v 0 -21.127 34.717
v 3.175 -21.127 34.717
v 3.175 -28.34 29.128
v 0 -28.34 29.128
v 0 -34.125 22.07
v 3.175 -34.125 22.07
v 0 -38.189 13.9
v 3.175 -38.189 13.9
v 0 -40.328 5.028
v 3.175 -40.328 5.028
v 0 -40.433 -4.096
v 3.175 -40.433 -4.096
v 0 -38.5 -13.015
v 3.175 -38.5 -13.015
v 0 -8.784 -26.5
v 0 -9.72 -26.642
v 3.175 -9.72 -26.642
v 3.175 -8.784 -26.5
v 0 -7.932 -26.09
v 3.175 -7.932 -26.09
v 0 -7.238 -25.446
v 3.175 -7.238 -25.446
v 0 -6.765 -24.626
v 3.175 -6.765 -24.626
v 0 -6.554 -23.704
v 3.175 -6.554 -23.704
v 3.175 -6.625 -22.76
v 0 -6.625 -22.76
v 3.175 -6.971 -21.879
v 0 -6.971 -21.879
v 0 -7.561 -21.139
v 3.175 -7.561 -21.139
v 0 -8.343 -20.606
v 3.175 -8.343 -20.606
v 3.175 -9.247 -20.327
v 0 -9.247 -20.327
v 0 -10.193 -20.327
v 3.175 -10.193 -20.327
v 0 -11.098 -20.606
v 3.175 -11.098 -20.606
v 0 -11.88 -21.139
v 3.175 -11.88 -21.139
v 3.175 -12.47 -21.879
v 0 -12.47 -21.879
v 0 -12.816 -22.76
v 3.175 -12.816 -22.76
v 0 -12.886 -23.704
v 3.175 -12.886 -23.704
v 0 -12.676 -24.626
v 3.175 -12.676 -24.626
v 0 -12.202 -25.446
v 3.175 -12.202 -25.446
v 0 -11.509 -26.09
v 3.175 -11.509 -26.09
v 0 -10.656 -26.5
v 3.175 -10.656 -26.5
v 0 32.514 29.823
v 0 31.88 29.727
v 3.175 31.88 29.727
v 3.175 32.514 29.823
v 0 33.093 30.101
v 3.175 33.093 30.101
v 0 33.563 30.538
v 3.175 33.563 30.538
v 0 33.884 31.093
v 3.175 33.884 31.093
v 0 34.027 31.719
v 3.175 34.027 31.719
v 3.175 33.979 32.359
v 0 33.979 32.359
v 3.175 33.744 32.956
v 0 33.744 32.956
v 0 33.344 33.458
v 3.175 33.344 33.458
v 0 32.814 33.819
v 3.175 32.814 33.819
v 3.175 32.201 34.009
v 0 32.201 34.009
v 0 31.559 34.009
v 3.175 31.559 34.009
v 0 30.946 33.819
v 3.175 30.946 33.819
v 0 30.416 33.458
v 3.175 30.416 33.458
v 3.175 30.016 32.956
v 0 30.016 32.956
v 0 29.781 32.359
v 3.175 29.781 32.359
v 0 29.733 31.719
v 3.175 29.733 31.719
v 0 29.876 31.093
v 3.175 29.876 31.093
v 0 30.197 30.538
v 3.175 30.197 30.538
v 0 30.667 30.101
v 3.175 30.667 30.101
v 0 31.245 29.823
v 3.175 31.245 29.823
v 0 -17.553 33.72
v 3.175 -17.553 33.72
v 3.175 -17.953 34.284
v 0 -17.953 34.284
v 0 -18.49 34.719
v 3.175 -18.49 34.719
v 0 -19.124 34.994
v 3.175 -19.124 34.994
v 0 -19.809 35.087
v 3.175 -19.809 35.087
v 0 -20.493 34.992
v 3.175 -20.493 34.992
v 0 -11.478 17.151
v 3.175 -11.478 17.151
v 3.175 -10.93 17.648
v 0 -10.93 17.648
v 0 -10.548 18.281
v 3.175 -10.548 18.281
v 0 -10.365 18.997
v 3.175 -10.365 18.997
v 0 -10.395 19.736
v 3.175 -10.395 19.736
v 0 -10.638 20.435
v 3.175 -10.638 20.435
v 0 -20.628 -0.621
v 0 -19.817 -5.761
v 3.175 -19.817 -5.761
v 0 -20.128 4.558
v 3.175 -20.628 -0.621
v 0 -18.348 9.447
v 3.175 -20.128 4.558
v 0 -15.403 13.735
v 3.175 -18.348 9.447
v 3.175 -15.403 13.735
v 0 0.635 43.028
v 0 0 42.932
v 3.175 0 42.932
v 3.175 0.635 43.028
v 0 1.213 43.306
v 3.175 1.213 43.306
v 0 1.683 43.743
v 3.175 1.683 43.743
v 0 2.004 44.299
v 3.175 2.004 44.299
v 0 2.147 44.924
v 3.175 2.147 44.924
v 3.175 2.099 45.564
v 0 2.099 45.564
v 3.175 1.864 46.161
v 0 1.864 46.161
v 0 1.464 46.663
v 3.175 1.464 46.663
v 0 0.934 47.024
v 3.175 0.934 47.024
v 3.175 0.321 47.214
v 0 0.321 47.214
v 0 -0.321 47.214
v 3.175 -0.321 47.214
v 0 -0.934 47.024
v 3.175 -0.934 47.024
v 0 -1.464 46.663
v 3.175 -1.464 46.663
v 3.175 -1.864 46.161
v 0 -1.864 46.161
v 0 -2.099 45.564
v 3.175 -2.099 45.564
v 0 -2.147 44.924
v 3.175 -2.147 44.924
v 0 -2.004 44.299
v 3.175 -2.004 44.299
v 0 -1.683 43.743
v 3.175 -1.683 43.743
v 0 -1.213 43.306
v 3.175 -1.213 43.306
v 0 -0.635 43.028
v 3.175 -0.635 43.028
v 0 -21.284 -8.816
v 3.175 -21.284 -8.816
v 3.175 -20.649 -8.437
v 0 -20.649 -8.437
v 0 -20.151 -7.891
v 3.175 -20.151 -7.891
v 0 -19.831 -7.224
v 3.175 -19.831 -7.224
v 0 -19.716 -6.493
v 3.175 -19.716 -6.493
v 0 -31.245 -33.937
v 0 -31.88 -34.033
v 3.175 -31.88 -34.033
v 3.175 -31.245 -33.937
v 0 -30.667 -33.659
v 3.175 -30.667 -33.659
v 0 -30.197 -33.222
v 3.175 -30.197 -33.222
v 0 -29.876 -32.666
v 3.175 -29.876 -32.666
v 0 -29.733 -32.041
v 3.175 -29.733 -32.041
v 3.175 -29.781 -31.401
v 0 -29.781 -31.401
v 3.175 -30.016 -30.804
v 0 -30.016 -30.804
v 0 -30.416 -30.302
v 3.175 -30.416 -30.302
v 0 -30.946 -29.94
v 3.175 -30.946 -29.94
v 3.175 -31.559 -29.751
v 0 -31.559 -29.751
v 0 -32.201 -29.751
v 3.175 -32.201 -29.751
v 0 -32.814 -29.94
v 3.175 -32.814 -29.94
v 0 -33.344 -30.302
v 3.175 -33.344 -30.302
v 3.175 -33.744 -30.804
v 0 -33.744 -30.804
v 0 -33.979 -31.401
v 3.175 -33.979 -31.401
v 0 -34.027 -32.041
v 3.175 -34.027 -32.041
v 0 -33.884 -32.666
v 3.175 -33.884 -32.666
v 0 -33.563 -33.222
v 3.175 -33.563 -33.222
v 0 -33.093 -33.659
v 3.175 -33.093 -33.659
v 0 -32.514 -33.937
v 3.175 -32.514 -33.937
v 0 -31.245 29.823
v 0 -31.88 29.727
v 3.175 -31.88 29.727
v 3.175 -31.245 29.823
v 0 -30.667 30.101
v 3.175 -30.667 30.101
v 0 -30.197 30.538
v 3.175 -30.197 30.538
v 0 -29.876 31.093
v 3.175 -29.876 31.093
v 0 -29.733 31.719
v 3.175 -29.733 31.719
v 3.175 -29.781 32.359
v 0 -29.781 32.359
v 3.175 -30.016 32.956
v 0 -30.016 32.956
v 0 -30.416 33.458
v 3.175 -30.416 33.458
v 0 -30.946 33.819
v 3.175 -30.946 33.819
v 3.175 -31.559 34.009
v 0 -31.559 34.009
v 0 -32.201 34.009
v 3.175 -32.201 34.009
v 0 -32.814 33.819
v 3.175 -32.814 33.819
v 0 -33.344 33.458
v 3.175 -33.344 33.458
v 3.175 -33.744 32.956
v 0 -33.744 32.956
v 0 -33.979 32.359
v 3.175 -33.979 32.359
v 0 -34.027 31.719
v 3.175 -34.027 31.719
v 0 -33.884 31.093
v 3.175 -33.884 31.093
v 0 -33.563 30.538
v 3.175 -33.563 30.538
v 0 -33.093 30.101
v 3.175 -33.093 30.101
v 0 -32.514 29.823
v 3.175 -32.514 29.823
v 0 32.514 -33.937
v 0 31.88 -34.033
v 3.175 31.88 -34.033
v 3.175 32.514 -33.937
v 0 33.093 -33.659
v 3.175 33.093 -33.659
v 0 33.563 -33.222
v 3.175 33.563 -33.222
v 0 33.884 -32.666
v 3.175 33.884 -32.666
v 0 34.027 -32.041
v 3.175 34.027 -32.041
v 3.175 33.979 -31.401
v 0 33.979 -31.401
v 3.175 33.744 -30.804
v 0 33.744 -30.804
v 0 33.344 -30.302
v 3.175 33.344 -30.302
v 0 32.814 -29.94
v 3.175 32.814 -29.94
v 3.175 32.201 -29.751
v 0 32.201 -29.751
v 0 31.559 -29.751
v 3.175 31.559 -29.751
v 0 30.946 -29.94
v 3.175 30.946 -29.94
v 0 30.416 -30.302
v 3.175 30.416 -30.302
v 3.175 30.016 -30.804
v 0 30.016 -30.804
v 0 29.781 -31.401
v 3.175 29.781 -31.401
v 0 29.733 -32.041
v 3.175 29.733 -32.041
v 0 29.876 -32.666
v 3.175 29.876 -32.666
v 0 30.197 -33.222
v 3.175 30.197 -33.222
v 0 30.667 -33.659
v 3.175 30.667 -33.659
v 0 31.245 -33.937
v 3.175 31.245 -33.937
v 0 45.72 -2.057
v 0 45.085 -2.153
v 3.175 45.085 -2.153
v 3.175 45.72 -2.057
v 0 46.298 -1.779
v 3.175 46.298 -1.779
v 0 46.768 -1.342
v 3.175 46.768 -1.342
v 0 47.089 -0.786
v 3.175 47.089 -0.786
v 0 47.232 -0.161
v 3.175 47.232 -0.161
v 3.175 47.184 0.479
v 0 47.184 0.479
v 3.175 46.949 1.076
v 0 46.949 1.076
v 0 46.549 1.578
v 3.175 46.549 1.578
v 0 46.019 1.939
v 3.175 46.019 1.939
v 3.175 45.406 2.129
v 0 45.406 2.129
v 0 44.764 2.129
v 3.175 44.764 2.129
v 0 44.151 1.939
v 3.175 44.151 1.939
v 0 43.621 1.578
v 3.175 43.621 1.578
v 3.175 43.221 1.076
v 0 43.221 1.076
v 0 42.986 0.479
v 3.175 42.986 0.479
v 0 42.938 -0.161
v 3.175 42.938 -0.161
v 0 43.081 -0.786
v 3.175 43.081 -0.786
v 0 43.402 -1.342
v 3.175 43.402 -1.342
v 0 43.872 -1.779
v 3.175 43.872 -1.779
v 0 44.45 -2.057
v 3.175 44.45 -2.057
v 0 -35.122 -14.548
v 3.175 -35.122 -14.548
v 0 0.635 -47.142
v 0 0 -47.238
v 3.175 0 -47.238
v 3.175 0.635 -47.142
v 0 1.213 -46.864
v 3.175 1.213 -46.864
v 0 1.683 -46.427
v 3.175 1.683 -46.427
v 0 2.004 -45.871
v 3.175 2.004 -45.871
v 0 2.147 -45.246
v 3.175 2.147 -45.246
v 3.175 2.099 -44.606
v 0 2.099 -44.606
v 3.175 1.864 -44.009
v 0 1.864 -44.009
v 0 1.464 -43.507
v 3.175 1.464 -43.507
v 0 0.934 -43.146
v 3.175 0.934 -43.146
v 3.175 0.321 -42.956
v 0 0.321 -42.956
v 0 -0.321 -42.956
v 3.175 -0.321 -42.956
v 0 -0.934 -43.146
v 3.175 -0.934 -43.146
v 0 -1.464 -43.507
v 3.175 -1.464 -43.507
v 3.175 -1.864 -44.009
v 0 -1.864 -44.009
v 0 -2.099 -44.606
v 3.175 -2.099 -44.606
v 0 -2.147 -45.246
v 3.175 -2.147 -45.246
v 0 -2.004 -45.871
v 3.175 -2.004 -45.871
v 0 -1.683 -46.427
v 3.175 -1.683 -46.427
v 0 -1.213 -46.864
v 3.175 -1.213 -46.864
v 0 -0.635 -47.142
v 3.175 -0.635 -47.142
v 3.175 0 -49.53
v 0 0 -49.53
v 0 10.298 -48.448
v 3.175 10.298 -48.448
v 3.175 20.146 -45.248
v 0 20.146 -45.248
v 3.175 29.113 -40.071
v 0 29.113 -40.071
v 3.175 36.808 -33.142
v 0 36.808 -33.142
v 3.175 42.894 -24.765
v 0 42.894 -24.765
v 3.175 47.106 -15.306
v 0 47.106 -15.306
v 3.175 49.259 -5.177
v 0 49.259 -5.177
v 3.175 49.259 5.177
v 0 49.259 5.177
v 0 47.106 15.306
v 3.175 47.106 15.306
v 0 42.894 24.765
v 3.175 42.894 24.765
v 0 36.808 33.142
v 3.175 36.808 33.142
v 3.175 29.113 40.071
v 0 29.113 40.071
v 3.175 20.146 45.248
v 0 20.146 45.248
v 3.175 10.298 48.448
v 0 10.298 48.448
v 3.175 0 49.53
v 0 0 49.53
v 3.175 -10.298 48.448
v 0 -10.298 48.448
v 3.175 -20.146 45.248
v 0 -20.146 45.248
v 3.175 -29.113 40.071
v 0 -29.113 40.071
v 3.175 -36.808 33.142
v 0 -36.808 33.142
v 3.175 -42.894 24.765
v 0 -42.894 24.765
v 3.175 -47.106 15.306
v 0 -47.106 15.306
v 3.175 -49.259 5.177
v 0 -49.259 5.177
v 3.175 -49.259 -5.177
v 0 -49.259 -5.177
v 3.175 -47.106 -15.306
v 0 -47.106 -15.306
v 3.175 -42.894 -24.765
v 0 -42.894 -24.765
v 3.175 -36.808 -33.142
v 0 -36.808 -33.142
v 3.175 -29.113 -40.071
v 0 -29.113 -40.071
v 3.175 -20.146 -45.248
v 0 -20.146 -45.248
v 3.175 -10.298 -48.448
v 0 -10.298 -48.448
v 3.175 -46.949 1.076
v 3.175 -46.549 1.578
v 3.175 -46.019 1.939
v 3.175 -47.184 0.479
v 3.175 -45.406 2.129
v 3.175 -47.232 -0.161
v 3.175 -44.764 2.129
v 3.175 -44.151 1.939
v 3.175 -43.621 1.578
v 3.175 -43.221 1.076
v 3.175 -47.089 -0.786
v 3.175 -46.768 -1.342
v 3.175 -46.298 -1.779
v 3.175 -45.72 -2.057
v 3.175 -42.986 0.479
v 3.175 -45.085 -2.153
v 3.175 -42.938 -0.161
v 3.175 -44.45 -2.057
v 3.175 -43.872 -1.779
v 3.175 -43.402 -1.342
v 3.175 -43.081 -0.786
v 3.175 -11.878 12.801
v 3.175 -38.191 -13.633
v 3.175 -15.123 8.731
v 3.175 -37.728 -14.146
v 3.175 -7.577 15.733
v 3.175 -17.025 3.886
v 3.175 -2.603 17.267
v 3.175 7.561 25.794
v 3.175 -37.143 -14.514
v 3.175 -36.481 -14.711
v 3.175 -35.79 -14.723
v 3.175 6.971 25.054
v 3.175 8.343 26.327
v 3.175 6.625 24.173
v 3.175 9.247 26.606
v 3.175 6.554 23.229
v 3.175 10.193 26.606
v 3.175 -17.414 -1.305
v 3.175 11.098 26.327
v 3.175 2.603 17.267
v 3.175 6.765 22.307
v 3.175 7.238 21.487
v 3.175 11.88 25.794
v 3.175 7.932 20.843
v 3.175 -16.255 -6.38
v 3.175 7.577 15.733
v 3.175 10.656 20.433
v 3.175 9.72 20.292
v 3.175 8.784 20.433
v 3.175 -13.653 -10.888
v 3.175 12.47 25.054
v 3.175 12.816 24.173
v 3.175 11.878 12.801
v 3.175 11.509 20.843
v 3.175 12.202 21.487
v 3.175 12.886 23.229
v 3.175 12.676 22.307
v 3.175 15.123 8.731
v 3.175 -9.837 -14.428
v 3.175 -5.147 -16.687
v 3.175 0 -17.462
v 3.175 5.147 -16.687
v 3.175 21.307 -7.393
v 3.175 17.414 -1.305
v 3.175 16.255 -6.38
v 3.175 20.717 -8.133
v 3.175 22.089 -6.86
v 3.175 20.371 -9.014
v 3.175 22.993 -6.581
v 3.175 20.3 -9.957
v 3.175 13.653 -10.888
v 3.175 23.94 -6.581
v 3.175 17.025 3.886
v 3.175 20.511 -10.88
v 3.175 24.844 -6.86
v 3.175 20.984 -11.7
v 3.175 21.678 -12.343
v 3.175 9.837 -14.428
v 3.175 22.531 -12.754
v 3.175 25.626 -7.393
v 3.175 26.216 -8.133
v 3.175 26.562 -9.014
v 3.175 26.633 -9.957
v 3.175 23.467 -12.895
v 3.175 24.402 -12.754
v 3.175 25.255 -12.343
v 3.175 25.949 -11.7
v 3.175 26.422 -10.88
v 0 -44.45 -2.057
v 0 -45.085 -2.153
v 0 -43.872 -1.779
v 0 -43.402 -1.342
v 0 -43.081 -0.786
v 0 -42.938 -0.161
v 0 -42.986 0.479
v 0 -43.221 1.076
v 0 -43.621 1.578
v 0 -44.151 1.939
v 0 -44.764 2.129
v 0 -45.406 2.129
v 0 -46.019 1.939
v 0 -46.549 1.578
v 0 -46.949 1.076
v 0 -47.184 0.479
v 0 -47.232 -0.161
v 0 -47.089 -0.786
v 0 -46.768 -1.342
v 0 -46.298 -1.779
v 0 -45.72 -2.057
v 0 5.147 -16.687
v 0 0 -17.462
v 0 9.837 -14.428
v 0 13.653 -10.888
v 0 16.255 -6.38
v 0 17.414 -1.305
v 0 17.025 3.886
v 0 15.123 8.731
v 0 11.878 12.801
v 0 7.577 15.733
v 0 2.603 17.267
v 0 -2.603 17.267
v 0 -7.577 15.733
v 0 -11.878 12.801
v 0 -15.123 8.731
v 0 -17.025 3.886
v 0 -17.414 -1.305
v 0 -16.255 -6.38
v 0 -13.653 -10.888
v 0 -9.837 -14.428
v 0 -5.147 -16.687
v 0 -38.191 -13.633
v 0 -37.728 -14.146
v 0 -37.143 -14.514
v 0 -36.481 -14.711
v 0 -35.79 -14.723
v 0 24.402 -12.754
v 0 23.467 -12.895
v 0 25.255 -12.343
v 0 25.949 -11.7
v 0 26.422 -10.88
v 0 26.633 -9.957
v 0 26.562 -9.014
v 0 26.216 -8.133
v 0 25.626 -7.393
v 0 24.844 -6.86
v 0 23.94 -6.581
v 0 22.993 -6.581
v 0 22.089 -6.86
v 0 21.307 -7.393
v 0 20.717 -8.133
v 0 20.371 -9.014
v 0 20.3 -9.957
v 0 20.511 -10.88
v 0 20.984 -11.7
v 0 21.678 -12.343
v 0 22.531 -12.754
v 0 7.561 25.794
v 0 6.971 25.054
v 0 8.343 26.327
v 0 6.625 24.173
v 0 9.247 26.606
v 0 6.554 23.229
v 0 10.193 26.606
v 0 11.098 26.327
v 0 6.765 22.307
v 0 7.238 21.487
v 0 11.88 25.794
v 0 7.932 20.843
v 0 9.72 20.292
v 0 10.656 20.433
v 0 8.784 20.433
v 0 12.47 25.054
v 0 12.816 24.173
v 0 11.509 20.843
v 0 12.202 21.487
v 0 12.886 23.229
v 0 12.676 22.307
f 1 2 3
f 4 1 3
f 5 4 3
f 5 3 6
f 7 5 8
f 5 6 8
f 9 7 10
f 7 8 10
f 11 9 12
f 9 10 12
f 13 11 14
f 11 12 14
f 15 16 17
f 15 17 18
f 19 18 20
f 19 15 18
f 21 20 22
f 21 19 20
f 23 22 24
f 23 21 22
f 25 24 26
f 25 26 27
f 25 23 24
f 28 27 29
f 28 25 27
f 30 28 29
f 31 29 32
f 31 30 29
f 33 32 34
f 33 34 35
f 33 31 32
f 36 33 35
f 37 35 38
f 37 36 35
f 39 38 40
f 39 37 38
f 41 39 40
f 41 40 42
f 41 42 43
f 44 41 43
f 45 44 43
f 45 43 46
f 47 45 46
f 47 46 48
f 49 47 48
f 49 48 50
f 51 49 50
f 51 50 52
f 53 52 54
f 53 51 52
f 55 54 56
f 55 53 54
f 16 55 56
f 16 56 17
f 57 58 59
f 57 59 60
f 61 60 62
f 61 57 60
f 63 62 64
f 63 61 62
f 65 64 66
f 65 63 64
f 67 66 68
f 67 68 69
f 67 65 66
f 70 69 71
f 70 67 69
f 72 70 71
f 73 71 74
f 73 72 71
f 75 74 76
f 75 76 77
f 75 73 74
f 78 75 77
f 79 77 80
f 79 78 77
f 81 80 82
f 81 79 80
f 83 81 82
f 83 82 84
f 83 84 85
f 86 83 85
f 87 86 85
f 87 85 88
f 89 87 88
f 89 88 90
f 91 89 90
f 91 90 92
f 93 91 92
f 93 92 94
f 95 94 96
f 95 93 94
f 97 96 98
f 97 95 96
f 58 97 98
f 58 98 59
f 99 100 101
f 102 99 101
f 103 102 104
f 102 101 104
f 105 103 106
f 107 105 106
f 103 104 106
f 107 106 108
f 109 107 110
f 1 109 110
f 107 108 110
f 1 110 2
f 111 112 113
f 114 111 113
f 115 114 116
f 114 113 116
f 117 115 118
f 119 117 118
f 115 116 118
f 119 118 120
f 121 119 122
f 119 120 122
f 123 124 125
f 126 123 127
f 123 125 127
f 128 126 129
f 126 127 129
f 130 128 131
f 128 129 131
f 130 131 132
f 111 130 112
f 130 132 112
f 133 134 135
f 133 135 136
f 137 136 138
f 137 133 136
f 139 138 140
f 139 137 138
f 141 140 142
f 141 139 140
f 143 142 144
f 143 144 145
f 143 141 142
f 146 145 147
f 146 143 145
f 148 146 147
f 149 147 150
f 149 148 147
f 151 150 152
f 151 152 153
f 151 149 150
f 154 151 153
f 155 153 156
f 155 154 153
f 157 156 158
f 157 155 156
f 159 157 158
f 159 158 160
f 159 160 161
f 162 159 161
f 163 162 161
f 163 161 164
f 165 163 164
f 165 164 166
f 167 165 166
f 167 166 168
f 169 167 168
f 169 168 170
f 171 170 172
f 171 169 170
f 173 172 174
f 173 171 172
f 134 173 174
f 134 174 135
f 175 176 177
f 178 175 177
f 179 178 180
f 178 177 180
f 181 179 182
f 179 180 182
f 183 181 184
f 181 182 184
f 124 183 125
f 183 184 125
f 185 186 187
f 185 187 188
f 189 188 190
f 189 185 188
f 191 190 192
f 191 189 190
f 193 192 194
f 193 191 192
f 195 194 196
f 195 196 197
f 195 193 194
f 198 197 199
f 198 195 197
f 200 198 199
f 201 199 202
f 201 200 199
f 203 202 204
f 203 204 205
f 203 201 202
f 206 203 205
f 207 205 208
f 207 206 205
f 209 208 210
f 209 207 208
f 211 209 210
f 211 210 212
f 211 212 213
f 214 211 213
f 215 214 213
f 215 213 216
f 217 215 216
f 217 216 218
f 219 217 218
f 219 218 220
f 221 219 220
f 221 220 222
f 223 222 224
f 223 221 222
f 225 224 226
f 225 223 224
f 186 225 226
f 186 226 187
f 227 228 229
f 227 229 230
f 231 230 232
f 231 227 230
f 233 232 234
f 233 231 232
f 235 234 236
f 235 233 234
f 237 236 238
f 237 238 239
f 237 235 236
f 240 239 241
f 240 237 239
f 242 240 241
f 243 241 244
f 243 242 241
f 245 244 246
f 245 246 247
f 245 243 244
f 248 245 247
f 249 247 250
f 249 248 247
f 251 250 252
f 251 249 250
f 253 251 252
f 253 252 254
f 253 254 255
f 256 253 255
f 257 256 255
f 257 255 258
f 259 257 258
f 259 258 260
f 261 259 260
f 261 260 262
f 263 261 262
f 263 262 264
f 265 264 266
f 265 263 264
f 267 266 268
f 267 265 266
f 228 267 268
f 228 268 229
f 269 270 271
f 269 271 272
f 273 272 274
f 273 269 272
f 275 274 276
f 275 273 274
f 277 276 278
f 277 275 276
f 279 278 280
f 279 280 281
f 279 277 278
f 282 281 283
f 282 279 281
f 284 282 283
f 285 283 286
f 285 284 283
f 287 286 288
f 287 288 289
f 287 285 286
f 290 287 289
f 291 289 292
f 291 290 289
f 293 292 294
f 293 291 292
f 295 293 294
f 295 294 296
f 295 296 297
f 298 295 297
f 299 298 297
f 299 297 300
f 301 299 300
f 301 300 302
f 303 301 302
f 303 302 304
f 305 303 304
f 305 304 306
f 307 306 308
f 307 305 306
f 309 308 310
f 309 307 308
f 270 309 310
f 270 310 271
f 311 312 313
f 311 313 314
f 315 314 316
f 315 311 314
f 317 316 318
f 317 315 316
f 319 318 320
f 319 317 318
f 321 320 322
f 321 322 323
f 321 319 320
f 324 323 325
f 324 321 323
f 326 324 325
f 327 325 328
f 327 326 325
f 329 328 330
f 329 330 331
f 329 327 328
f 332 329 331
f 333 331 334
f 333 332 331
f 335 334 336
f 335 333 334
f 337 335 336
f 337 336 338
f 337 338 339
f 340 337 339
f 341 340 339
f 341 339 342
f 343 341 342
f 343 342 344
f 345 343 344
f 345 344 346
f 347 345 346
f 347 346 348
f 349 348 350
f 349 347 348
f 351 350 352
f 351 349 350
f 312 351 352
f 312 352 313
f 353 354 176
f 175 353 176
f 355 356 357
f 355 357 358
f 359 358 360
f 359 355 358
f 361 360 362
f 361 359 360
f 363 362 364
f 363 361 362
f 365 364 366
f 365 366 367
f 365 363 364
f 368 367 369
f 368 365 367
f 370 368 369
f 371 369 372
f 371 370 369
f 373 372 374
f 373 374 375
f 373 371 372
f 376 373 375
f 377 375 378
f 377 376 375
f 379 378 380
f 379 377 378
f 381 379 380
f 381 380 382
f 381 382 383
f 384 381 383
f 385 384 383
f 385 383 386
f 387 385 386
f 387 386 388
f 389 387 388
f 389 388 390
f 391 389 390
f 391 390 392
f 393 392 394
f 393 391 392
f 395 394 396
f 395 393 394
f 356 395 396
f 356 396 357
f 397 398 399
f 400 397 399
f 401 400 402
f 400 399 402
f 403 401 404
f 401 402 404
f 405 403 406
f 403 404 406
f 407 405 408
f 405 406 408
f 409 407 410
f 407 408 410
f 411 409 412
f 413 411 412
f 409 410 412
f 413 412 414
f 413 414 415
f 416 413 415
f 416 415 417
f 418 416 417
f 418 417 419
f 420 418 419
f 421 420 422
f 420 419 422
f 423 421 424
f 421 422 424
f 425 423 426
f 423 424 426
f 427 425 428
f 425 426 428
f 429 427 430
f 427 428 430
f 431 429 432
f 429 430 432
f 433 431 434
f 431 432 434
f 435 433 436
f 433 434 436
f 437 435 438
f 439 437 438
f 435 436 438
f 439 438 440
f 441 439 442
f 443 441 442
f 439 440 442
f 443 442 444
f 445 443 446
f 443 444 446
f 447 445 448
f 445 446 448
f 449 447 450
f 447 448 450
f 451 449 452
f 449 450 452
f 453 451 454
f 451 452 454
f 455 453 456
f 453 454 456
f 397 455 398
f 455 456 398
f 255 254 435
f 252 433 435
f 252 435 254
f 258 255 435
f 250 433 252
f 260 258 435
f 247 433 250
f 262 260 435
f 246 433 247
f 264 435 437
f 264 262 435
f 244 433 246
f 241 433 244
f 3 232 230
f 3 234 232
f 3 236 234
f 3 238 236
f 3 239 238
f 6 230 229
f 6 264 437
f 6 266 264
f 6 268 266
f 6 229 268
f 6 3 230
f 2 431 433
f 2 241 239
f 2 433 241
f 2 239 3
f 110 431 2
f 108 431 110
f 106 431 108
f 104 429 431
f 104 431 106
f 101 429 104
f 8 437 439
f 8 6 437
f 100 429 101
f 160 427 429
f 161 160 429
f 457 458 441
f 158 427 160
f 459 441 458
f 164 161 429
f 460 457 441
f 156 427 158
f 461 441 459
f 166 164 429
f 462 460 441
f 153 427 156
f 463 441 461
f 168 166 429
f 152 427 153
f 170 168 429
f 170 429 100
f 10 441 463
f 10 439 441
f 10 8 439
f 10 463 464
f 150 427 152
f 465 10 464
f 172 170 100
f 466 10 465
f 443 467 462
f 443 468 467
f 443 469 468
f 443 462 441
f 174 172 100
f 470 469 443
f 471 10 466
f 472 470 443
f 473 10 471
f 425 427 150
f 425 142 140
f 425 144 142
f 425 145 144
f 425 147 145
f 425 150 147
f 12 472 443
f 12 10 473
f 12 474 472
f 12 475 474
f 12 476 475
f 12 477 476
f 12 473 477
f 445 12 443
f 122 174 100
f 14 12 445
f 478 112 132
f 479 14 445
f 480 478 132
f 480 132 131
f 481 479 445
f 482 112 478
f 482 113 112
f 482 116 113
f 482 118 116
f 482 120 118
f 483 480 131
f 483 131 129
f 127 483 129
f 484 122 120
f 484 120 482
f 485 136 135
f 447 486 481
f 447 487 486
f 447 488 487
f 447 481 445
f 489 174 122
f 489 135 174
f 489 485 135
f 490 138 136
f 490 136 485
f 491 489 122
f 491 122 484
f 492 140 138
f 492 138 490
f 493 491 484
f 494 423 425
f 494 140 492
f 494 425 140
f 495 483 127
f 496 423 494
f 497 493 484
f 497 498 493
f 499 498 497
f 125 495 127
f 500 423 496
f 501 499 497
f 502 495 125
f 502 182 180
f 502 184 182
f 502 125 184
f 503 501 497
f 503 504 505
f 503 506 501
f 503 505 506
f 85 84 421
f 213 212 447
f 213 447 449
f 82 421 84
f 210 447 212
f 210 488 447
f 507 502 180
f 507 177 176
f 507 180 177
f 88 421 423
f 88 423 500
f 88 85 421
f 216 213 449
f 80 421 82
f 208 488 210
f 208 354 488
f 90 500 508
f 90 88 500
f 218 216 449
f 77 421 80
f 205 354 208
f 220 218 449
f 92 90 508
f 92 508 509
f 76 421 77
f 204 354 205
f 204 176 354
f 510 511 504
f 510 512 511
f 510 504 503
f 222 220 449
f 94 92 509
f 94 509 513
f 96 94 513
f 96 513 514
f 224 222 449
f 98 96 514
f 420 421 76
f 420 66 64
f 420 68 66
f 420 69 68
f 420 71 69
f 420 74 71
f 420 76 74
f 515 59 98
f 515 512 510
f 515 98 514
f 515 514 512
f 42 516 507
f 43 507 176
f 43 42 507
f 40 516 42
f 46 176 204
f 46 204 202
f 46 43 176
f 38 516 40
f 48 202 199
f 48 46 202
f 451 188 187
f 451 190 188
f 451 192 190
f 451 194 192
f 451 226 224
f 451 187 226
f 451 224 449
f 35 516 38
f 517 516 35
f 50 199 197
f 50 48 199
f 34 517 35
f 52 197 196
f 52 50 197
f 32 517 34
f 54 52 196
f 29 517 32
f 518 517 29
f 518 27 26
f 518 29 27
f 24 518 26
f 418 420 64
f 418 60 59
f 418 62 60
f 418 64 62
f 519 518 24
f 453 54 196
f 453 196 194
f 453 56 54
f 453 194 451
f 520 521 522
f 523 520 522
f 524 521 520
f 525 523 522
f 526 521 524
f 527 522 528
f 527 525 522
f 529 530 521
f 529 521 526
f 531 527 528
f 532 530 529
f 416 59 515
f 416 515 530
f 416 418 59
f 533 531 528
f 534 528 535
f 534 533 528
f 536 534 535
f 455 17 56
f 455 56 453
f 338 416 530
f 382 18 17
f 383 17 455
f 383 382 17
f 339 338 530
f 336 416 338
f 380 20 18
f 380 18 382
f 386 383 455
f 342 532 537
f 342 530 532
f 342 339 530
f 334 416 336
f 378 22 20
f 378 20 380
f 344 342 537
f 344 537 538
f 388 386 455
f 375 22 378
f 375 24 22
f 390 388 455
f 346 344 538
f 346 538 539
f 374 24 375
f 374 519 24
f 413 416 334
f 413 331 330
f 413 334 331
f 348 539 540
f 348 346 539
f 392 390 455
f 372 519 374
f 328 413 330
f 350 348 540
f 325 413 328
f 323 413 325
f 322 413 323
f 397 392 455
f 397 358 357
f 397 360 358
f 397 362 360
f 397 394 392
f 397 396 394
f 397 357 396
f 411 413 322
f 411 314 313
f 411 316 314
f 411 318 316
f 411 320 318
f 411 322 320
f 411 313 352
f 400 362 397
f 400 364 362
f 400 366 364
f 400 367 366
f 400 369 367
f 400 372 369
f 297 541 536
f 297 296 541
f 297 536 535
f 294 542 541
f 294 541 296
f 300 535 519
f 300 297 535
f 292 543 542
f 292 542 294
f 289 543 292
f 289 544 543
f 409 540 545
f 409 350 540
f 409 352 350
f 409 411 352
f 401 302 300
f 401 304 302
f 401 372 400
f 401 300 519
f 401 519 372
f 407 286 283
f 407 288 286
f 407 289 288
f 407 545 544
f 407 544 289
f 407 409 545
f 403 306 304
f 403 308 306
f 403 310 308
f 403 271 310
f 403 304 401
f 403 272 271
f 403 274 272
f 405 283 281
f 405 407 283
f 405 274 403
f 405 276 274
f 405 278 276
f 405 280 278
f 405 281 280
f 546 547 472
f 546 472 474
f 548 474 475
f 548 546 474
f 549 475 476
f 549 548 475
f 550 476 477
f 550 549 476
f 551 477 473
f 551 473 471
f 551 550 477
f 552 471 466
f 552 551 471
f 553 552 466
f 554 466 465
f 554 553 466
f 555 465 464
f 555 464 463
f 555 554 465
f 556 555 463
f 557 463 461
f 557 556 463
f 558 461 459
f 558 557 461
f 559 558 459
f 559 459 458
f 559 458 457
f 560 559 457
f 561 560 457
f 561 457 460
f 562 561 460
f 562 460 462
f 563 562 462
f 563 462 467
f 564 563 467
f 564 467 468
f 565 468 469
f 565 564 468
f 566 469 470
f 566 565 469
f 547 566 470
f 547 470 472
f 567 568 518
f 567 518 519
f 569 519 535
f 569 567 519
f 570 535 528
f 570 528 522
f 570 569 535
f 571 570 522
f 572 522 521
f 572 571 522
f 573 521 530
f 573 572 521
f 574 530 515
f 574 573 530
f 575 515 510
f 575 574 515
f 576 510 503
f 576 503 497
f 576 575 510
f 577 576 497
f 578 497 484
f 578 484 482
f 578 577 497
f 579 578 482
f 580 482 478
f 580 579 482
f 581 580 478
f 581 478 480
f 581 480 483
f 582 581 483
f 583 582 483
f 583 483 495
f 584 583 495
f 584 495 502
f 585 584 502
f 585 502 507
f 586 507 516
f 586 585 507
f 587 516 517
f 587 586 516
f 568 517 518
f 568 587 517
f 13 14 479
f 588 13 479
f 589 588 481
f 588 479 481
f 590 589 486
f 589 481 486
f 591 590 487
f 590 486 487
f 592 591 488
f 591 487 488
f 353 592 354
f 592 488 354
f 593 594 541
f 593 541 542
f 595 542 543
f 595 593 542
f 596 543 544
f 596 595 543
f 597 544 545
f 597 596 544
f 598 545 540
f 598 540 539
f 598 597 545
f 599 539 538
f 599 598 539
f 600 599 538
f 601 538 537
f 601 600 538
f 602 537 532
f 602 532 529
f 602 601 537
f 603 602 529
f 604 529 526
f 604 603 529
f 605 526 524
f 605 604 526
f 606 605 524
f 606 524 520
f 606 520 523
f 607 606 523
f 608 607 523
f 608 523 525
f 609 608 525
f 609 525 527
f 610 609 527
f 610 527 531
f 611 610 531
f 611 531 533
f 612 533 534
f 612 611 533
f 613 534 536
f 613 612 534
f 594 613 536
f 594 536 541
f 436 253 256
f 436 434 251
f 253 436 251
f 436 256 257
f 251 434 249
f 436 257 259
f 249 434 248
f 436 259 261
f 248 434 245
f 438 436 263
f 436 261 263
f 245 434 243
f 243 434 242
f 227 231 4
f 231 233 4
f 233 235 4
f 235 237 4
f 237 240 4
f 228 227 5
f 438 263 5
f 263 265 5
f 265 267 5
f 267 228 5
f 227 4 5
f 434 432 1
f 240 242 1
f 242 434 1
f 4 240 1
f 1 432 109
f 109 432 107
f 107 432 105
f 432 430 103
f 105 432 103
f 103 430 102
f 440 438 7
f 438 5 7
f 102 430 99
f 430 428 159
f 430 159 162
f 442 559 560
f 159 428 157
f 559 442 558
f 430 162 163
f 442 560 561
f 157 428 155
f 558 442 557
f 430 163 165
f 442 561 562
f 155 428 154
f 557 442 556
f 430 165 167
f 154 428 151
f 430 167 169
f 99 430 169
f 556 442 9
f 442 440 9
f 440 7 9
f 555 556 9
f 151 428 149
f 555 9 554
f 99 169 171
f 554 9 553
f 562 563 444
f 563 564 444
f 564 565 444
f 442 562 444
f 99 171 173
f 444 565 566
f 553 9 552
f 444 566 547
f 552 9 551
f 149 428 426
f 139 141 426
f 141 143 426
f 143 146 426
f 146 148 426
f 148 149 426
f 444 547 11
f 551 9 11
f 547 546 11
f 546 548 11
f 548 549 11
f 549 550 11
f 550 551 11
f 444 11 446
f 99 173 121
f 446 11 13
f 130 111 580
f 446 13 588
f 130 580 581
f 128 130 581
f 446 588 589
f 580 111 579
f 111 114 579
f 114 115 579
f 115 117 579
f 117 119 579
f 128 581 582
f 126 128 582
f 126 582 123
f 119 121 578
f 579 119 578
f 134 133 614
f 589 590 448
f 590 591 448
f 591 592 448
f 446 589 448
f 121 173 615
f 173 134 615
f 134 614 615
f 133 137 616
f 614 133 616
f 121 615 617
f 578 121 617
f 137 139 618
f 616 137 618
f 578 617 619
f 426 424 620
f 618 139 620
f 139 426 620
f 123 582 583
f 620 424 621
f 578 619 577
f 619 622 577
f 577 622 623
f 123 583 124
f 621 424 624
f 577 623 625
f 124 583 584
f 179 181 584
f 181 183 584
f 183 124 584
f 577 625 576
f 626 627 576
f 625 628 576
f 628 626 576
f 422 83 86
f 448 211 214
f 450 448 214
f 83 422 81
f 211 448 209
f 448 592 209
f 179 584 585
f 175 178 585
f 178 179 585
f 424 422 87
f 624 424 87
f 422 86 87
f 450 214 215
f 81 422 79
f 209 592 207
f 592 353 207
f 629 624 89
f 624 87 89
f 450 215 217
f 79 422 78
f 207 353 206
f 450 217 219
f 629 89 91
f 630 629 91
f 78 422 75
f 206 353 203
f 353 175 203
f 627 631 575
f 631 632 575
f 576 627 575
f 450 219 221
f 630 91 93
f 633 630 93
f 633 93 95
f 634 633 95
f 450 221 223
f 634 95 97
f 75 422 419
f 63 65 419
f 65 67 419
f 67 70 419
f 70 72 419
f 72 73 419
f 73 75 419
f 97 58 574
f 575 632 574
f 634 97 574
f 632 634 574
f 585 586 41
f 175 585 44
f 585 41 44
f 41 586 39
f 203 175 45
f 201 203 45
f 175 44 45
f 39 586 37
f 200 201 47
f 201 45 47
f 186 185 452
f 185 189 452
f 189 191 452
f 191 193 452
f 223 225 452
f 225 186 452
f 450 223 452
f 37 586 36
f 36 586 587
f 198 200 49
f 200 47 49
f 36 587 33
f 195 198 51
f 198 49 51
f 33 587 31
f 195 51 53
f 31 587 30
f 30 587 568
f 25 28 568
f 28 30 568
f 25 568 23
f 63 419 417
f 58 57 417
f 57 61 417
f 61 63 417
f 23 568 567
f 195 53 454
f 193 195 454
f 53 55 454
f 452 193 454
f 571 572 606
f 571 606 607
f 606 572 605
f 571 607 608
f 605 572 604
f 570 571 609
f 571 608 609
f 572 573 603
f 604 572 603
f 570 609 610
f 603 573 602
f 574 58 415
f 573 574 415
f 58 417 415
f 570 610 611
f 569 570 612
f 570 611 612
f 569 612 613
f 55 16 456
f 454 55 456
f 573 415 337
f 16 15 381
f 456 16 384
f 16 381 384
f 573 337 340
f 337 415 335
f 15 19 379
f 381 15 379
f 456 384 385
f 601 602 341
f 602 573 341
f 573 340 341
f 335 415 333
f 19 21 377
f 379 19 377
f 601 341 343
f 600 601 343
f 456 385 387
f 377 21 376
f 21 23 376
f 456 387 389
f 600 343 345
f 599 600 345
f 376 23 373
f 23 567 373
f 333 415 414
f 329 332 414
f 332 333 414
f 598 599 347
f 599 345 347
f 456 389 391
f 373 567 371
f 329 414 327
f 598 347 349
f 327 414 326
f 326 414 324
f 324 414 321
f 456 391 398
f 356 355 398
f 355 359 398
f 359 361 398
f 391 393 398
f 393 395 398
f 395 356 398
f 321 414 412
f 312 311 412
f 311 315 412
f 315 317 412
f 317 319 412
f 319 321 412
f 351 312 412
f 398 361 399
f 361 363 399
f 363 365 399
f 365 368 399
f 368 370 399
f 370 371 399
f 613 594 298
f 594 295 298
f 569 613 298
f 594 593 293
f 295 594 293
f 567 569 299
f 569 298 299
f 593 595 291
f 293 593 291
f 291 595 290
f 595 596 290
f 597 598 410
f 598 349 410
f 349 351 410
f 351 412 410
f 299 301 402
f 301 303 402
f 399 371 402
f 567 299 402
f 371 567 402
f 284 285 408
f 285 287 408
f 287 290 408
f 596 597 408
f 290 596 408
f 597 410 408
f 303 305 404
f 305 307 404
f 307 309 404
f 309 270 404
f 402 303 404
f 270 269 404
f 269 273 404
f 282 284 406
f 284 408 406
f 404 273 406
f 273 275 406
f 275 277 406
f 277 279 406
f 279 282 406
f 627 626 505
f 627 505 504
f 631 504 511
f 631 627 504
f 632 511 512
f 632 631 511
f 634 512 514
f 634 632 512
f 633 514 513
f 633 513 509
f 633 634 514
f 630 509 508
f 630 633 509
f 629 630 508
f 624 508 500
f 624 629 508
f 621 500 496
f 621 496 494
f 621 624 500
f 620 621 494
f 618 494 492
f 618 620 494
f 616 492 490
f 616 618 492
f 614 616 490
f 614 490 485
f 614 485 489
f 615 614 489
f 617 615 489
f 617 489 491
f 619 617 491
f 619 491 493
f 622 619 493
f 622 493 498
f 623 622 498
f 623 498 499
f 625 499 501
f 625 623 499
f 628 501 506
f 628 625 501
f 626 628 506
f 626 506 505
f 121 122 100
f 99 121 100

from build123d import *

# Parameters (mm, degrees)
SKETCH1_R           = 49.53
SKETCH1_R_2         = 2.15265
SKETCH1_R_3         = 17.4625
SKETCH1_R_4         = 3.175
BOSS_EXTRUDE1_DEPTH = 3.175
CUT_EXTRUDE1_DEPTH  = 71.117918002


with BuildPart() as part:
    # Sketch1 → Boss-Extrude1 (new body)
    with BuildSketch(Plane(origin=(0, 0, 0), x_dir=(0, 0, -1), z_dir=(1, 0, 0))):
        Circle(SKETCH1_R)
        with Locations((0, 45.085)):
            Circle(SKETCH1_R_2, mode=Mode.SUBTRACT)
        with Locations((31.87990923, 31.87990923)):
            Circle(SKETCH1_R_2, mode=Mode.SUBTRACT)
        with Locations((45.085, 0)):
            Circle(SKETCH1_R_2, mode=Mode.SUBTRACT)
        with Locations((31.87990923, -31.87990923)):
            Circle(SKETCH1_R_2, mode=Mode.SUBTRACT)
        with Locations((0, -45.085)):
            Circle(SKETCH1_R_2, mode=Mode.SUBTRACT)
        with Locations((-31.87990923, -31.87990923)):
            Circle(SKETCH1_R_2, mode=Mode.SUBTRACT)
        with Locations((-45.085, 0)):
            Circle(SKETCH1_R_2, mode=Mode.SUBTRACT)
        with Locations((-31.87990923, 31.87990923)):
            Circle(SKETCH1_R_2, mode=Mode.SUBTRACT)
        Circle(SKETCH1_R_3, mode=Mode.SUBTRACT)
        with Locations((9.720159182, 23.466540126)):
            Circle(SKETCH1_R_4, mode=Mode.SUBTRACT)
        with Locations((23.466540126, -9.720159182)):
            Circle(SKETCH1_R_4, mode=Mode.SUBTRACT)
        with Locations((-9.720159182, -23.466540126)):
            Circle(SKETCH1_R_4, mode=Mode.SUBTRACT)
        with Locations((-23.466540126, 9.720159182)):
            Circle(SKETCH1_R_4, mode=Mode.SUBTRACT)
    extrude(amount=BOSS_EXTRUDE1_DEPTH)

    # Sketch2 → Cut-Extrude1 (cut, through all)
    with BuildSketch(Plane(origin=(3.175, 0, 0), x_dir=(0, 0, -1), z_dir=(1, 0, 0))):
        with BuildLine():
            Line((-20.434868218, -10.637719077), (-33.719928863, -17.553483913))
            ThreePointArc((-33.719928863, -17.553483913), (-34.993654696, -19.123916601), (-34.716893211, -21.126924191))
            ThreePointArc((-34.716893211, -21.126924191), (-13.899698625, -38.189108109), (13.014558026, -38.49975168))
            ThreePointArc((13.014558026, -38.49975168), (14.514078084, -37.143257699), (14.547802162, -35.121501281))
            Line((14.547802162, -35.121501281), (8.816223227, -21.284245682))
            ThreePointArc((8.816223227, -21.284245682), (7.568898247, -19.966485263), (5.760575328, -19.817219233))
            ThreePointArc((5.760575328, -19.817219233), (-7.058440708, -19.392906461), (-17.1511197, -11.478044227))
            ThreePointArc((-17.1511197, -11.478044227), (-18.632321778, -10.430021072), (-20.434868218, -10.637719077))
        make_face()
    extrude(amount=-CUT_EXTRUDE1_DEPTH, mode=Mode.SUBTRACT)


solid = part.part
